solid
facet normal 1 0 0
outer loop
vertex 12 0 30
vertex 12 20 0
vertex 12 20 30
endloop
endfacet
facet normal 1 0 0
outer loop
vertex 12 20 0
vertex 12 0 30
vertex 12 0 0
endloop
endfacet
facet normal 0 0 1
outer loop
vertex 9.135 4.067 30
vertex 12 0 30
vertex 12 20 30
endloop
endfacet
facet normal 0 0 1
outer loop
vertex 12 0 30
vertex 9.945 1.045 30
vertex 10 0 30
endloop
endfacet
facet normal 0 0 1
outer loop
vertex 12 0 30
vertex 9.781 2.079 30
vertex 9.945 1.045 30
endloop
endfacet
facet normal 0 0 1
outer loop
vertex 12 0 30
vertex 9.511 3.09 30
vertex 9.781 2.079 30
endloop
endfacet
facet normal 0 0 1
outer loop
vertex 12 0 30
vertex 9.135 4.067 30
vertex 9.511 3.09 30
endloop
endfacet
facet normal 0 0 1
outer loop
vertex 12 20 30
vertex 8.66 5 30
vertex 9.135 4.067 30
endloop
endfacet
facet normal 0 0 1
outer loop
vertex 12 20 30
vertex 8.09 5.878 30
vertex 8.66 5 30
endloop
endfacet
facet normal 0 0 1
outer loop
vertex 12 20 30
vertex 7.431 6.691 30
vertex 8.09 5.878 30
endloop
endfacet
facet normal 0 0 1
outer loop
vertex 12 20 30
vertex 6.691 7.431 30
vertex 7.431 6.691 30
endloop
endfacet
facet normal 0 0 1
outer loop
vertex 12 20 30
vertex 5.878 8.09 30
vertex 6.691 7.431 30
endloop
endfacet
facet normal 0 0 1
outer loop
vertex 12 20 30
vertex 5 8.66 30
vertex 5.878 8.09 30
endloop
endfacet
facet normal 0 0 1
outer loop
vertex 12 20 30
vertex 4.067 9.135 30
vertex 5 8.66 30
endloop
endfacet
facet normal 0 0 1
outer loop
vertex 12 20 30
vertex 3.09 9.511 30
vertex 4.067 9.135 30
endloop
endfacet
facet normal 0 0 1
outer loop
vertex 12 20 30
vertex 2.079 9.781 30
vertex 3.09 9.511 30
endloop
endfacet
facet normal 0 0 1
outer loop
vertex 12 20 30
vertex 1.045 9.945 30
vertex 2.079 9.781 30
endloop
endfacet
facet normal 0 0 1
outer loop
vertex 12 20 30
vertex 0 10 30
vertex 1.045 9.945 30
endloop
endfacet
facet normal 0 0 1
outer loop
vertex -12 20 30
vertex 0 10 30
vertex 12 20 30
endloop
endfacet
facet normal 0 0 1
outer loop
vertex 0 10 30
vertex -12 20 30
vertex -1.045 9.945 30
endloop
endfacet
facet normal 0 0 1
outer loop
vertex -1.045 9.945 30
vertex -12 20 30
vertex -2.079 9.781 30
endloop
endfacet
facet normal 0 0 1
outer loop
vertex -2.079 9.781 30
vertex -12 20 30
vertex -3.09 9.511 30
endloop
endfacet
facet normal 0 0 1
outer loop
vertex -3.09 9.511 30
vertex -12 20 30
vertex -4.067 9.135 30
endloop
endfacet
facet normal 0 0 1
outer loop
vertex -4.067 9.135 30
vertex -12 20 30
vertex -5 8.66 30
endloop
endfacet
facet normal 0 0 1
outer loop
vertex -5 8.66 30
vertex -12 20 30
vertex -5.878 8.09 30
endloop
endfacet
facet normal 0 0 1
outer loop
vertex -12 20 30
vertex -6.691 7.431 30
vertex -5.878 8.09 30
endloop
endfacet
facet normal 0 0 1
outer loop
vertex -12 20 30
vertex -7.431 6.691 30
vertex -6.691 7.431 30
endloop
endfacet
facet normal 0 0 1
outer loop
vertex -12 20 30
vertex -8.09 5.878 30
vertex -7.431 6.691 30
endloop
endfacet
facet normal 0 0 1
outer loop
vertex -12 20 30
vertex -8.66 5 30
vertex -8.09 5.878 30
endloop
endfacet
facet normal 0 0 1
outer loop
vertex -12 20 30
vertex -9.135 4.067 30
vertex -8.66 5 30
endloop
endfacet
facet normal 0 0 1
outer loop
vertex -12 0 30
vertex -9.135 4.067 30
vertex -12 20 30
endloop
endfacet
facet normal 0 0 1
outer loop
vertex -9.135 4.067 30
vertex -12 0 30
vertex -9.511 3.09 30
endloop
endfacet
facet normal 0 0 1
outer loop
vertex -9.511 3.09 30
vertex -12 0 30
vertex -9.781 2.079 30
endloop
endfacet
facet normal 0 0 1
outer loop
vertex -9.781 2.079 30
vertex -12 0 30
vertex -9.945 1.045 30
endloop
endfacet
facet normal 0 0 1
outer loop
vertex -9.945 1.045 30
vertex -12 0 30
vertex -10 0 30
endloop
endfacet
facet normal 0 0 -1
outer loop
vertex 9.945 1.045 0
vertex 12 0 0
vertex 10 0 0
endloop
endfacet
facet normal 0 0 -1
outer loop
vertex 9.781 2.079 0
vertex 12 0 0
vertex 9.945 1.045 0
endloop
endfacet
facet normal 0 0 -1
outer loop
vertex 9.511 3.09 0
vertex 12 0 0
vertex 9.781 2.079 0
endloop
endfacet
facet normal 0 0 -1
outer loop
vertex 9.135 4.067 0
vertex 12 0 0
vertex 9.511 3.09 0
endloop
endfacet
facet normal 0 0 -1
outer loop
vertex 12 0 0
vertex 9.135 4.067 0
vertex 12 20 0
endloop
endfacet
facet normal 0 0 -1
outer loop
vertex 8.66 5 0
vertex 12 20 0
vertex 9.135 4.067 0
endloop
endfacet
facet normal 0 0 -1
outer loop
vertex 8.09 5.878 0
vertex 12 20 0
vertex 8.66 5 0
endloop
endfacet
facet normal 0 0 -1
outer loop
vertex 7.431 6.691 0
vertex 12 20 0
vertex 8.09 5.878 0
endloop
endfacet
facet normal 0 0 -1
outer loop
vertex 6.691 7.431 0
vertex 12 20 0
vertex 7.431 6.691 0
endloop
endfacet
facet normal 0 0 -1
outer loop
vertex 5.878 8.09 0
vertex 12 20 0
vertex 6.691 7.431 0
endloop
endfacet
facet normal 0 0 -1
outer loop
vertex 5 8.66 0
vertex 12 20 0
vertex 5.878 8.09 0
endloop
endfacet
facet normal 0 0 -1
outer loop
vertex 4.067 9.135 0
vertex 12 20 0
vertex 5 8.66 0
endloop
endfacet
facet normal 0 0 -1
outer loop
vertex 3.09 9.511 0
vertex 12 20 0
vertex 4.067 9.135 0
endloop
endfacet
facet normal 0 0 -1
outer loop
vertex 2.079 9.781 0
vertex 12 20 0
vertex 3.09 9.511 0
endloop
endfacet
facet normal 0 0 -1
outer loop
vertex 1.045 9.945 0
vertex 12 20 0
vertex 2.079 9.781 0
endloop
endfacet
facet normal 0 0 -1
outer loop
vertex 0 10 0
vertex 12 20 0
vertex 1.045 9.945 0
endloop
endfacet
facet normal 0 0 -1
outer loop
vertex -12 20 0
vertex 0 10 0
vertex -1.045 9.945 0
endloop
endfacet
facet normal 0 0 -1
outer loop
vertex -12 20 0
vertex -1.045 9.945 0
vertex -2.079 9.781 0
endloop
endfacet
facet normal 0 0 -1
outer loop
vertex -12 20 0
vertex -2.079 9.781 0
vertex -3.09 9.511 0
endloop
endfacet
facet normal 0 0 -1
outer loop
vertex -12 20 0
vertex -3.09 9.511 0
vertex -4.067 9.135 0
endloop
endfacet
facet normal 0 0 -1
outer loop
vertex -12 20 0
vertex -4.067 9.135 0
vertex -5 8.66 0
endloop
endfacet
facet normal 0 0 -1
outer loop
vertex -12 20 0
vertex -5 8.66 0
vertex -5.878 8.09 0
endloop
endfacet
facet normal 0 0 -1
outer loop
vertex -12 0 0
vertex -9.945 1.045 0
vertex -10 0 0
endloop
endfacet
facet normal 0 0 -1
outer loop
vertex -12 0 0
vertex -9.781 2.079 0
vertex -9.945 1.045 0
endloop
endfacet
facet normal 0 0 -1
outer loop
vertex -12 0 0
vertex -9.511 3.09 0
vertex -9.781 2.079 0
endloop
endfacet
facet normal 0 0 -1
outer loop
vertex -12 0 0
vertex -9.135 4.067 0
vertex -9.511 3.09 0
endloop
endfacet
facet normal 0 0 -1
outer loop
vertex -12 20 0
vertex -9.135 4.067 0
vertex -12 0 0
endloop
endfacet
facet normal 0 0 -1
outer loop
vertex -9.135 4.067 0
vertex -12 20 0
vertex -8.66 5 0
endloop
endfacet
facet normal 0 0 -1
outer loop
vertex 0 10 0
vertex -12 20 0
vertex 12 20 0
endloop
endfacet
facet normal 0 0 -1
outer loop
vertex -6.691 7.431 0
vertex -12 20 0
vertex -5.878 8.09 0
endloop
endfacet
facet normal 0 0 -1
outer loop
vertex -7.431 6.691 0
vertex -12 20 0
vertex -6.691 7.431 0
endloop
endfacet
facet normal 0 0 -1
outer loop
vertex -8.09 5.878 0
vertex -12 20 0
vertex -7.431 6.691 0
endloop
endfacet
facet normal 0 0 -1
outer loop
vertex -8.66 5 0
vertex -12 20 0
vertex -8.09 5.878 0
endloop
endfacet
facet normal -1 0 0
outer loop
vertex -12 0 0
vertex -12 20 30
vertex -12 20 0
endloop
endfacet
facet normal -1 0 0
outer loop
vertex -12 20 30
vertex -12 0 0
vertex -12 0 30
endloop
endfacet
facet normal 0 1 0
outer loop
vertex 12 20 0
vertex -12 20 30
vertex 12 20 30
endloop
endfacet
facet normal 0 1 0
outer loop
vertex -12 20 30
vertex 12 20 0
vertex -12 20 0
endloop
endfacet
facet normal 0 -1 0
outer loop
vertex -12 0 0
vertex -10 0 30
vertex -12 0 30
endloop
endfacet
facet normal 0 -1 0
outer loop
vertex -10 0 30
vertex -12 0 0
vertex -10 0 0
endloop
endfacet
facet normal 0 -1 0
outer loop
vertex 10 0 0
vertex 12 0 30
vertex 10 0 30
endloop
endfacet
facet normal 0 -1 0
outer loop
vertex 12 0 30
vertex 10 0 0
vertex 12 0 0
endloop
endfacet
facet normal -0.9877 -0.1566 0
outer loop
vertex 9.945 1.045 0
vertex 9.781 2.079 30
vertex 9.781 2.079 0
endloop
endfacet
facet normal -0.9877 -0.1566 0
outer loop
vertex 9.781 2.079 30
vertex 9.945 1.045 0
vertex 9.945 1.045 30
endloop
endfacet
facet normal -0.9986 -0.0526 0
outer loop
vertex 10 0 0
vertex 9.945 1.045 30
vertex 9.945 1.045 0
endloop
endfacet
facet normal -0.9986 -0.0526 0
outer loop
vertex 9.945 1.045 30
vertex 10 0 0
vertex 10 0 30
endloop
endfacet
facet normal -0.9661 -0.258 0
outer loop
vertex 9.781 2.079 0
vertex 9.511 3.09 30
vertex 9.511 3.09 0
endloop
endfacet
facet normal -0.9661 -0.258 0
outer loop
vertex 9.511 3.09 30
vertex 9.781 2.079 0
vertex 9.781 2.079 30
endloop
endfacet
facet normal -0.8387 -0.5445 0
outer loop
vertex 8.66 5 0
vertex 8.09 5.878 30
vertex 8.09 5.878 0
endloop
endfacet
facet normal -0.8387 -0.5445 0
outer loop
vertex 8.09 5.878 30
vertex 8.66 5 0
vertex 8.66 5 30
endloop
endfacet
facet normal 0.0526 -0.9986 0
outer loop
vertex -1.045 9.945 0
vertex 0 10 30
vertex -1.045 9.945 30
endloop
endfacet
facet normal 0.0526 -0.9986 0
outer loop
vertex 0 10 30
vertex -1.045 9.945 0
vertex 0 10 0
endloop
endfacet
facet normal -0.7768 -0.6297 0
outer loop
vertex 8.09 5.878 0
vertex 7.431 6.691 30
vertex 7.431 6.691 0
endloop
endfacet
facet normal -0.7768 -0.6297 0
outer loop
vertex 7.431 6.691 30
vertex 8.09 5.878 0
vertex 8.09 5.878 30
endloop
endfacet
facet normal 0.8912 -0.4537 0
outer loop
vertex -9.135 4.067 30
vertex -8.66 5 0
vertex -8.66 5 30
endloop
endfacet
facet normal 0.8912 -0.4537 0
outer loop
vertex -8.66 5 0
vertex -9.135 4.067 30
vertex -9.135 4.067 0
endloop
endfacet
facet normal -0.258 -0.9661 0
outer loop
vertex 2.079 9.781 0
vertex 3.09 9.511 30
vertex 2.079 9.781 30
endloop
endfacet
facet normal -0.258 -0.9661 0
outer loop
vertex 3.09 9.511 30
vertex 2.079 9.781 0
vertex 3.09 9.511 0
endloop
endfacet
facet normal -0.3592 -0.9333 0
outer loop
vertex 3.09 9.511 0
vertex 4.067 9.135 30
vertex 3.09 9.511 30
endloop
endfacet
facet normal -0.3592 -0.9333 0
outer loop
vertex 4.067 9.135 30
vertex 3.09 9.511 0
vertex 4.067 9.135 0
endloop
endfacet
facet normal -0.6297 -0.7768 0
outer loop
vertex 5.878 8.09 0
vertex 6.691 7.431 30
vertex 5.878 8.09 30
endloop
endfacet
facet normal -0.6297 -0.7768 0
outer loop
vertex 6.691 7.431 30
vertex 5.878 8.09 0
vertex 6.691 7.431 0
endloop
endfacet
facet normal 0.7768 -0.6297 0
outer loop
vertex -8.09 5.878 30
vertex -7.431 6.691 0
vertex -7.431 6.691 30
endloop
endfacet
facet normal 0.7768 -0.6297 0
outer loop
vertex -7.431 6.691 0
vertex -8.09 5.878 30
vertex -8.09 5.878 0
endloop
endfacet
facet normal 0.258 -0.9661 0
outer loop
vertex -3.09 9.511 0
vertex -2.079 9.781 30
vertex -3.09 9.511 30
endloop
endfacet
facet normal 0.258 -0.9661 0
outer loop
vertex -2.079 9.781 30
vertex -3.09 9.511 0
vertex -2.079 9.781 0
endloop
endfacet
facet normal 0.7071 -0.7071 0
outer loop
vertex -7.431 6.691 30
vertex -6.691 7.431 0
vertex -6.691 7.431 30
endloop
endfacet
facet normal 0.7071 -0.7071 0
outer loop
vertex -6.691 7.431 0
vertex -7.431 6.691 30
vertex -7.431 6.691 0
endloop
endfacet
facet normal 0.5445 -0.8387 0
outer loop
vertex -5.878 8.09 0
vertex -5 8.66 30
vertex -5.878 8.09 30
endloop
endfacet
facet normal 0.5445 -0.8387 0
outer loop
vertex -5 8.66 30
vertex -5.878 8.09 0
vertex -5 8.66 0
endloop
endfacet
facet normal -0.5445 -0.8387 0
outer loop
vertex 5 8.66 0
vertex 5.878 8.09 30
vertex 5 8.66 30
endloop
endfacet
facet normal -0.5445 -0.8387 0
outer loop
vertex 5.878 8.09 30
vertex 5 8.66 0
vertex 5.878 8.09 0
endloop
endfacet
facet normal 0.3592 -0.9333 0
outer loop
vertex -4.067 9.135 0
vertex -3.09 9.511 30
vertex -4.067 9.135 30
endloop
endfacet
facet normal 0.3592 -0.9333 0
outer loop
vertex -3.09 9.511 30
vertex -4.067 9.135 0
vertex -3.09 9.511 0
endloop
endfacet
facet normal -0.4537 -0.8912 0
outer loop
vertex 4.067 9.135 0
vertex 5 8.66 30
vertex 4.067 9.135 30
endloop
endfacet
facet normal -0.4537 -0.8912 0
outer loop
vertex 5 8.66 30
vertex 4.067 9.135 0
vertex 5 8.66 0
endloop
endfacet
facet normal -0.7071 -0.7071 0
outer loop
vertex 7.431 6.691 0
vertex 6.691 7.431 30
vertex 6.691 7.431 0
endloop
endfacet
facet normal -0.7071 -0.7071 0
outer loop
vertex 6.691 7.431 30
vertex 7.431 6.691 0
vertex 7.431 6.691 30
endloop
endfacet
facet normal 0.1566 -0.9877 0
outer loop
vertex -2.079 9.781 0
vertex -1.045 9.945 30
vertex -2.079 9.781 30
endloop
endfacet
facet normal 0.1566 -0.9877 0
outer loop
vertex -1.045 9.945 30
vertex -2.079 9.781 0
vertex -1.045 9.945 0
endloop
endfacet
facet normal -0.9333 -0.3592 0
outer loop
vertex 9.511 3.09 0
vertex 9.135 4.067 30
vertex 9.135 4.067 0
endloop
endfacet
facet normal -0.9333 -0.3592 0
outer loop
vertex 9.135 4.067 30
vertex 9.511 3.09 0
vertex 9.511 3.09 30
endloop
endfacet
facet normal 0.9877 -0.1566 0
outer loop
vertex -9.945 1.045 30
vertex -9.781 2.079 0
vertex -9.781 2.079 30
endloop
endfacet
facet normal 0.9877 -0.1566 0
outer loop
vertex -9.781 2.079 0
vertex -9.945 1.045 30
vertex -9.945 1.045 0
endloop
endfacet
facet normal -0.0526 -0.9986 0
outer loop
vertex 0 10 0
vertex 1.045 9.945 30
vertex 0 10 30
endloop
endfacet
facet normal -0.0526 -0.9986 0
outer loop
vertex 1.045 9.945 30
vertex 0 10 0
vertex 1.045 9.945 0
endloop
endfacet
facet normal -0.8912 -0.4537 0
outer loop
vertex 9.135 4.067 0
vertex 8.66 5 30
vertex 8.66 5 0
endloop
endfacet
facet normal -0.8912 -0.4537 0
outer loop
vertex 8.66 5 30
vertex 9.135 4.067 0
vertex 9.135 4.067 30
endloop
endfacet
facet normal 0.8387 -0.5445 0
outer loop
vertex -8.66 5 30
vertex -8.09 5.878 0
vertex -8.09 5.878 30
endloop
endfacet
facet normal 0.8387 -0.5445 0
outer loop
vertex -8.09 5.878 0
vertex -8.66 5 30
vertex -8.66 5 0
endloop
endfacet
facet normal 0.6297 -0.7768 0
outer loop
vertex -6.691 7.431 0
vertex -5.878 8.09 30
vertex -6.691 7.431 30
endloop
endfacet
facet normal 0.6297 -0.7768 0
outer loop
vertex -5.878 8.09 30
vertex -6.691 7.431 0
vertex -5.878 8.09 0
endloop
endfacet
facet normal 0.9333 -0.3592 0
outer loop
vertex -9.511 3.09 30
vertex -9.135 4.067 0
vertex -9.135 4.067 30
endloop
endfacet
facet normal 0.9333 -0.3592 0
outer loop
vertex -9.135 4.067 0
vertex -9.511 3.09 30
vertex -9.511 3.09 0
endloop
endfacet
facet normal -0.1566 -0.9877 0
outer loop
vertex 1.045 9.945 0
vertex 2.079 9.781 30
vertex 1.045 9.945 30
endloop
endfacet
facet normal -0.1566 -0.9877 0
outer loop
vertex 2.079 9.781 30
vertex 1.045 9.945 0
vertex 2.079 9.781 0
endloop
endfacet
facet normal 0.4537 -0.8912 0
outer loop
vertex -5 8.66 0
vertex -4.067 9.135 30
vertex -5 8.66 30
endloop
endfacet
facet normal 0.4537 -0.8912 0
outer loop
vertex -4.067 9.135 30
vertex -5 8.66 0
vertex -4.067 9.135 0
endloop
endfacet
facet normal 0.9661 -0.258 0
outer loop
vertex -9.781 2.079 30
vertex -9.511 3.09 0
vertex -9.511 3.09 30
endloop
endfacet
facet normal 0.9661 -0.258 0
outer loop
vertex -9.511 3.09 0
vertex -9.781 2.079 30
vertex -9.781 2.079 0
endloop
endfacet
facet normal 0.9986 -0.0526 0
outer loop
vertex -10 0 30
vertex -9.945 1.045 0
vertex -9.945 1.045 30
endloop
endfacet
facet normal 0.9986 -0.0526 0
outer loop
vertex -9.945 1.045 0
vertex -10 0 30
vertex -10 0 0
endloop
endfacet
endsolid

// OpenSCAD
difference(){
translate([-12,0,0]){
cube([24,20,30]);
}
translate([0,0,-1]){
cylinder(r=10,h=100,$fn=60);
}//end translate
}//end difference




//rotate([90,0,00]){
//cube([10,8,1]);
//}//end rotate


//%cube([500,500,500]);
